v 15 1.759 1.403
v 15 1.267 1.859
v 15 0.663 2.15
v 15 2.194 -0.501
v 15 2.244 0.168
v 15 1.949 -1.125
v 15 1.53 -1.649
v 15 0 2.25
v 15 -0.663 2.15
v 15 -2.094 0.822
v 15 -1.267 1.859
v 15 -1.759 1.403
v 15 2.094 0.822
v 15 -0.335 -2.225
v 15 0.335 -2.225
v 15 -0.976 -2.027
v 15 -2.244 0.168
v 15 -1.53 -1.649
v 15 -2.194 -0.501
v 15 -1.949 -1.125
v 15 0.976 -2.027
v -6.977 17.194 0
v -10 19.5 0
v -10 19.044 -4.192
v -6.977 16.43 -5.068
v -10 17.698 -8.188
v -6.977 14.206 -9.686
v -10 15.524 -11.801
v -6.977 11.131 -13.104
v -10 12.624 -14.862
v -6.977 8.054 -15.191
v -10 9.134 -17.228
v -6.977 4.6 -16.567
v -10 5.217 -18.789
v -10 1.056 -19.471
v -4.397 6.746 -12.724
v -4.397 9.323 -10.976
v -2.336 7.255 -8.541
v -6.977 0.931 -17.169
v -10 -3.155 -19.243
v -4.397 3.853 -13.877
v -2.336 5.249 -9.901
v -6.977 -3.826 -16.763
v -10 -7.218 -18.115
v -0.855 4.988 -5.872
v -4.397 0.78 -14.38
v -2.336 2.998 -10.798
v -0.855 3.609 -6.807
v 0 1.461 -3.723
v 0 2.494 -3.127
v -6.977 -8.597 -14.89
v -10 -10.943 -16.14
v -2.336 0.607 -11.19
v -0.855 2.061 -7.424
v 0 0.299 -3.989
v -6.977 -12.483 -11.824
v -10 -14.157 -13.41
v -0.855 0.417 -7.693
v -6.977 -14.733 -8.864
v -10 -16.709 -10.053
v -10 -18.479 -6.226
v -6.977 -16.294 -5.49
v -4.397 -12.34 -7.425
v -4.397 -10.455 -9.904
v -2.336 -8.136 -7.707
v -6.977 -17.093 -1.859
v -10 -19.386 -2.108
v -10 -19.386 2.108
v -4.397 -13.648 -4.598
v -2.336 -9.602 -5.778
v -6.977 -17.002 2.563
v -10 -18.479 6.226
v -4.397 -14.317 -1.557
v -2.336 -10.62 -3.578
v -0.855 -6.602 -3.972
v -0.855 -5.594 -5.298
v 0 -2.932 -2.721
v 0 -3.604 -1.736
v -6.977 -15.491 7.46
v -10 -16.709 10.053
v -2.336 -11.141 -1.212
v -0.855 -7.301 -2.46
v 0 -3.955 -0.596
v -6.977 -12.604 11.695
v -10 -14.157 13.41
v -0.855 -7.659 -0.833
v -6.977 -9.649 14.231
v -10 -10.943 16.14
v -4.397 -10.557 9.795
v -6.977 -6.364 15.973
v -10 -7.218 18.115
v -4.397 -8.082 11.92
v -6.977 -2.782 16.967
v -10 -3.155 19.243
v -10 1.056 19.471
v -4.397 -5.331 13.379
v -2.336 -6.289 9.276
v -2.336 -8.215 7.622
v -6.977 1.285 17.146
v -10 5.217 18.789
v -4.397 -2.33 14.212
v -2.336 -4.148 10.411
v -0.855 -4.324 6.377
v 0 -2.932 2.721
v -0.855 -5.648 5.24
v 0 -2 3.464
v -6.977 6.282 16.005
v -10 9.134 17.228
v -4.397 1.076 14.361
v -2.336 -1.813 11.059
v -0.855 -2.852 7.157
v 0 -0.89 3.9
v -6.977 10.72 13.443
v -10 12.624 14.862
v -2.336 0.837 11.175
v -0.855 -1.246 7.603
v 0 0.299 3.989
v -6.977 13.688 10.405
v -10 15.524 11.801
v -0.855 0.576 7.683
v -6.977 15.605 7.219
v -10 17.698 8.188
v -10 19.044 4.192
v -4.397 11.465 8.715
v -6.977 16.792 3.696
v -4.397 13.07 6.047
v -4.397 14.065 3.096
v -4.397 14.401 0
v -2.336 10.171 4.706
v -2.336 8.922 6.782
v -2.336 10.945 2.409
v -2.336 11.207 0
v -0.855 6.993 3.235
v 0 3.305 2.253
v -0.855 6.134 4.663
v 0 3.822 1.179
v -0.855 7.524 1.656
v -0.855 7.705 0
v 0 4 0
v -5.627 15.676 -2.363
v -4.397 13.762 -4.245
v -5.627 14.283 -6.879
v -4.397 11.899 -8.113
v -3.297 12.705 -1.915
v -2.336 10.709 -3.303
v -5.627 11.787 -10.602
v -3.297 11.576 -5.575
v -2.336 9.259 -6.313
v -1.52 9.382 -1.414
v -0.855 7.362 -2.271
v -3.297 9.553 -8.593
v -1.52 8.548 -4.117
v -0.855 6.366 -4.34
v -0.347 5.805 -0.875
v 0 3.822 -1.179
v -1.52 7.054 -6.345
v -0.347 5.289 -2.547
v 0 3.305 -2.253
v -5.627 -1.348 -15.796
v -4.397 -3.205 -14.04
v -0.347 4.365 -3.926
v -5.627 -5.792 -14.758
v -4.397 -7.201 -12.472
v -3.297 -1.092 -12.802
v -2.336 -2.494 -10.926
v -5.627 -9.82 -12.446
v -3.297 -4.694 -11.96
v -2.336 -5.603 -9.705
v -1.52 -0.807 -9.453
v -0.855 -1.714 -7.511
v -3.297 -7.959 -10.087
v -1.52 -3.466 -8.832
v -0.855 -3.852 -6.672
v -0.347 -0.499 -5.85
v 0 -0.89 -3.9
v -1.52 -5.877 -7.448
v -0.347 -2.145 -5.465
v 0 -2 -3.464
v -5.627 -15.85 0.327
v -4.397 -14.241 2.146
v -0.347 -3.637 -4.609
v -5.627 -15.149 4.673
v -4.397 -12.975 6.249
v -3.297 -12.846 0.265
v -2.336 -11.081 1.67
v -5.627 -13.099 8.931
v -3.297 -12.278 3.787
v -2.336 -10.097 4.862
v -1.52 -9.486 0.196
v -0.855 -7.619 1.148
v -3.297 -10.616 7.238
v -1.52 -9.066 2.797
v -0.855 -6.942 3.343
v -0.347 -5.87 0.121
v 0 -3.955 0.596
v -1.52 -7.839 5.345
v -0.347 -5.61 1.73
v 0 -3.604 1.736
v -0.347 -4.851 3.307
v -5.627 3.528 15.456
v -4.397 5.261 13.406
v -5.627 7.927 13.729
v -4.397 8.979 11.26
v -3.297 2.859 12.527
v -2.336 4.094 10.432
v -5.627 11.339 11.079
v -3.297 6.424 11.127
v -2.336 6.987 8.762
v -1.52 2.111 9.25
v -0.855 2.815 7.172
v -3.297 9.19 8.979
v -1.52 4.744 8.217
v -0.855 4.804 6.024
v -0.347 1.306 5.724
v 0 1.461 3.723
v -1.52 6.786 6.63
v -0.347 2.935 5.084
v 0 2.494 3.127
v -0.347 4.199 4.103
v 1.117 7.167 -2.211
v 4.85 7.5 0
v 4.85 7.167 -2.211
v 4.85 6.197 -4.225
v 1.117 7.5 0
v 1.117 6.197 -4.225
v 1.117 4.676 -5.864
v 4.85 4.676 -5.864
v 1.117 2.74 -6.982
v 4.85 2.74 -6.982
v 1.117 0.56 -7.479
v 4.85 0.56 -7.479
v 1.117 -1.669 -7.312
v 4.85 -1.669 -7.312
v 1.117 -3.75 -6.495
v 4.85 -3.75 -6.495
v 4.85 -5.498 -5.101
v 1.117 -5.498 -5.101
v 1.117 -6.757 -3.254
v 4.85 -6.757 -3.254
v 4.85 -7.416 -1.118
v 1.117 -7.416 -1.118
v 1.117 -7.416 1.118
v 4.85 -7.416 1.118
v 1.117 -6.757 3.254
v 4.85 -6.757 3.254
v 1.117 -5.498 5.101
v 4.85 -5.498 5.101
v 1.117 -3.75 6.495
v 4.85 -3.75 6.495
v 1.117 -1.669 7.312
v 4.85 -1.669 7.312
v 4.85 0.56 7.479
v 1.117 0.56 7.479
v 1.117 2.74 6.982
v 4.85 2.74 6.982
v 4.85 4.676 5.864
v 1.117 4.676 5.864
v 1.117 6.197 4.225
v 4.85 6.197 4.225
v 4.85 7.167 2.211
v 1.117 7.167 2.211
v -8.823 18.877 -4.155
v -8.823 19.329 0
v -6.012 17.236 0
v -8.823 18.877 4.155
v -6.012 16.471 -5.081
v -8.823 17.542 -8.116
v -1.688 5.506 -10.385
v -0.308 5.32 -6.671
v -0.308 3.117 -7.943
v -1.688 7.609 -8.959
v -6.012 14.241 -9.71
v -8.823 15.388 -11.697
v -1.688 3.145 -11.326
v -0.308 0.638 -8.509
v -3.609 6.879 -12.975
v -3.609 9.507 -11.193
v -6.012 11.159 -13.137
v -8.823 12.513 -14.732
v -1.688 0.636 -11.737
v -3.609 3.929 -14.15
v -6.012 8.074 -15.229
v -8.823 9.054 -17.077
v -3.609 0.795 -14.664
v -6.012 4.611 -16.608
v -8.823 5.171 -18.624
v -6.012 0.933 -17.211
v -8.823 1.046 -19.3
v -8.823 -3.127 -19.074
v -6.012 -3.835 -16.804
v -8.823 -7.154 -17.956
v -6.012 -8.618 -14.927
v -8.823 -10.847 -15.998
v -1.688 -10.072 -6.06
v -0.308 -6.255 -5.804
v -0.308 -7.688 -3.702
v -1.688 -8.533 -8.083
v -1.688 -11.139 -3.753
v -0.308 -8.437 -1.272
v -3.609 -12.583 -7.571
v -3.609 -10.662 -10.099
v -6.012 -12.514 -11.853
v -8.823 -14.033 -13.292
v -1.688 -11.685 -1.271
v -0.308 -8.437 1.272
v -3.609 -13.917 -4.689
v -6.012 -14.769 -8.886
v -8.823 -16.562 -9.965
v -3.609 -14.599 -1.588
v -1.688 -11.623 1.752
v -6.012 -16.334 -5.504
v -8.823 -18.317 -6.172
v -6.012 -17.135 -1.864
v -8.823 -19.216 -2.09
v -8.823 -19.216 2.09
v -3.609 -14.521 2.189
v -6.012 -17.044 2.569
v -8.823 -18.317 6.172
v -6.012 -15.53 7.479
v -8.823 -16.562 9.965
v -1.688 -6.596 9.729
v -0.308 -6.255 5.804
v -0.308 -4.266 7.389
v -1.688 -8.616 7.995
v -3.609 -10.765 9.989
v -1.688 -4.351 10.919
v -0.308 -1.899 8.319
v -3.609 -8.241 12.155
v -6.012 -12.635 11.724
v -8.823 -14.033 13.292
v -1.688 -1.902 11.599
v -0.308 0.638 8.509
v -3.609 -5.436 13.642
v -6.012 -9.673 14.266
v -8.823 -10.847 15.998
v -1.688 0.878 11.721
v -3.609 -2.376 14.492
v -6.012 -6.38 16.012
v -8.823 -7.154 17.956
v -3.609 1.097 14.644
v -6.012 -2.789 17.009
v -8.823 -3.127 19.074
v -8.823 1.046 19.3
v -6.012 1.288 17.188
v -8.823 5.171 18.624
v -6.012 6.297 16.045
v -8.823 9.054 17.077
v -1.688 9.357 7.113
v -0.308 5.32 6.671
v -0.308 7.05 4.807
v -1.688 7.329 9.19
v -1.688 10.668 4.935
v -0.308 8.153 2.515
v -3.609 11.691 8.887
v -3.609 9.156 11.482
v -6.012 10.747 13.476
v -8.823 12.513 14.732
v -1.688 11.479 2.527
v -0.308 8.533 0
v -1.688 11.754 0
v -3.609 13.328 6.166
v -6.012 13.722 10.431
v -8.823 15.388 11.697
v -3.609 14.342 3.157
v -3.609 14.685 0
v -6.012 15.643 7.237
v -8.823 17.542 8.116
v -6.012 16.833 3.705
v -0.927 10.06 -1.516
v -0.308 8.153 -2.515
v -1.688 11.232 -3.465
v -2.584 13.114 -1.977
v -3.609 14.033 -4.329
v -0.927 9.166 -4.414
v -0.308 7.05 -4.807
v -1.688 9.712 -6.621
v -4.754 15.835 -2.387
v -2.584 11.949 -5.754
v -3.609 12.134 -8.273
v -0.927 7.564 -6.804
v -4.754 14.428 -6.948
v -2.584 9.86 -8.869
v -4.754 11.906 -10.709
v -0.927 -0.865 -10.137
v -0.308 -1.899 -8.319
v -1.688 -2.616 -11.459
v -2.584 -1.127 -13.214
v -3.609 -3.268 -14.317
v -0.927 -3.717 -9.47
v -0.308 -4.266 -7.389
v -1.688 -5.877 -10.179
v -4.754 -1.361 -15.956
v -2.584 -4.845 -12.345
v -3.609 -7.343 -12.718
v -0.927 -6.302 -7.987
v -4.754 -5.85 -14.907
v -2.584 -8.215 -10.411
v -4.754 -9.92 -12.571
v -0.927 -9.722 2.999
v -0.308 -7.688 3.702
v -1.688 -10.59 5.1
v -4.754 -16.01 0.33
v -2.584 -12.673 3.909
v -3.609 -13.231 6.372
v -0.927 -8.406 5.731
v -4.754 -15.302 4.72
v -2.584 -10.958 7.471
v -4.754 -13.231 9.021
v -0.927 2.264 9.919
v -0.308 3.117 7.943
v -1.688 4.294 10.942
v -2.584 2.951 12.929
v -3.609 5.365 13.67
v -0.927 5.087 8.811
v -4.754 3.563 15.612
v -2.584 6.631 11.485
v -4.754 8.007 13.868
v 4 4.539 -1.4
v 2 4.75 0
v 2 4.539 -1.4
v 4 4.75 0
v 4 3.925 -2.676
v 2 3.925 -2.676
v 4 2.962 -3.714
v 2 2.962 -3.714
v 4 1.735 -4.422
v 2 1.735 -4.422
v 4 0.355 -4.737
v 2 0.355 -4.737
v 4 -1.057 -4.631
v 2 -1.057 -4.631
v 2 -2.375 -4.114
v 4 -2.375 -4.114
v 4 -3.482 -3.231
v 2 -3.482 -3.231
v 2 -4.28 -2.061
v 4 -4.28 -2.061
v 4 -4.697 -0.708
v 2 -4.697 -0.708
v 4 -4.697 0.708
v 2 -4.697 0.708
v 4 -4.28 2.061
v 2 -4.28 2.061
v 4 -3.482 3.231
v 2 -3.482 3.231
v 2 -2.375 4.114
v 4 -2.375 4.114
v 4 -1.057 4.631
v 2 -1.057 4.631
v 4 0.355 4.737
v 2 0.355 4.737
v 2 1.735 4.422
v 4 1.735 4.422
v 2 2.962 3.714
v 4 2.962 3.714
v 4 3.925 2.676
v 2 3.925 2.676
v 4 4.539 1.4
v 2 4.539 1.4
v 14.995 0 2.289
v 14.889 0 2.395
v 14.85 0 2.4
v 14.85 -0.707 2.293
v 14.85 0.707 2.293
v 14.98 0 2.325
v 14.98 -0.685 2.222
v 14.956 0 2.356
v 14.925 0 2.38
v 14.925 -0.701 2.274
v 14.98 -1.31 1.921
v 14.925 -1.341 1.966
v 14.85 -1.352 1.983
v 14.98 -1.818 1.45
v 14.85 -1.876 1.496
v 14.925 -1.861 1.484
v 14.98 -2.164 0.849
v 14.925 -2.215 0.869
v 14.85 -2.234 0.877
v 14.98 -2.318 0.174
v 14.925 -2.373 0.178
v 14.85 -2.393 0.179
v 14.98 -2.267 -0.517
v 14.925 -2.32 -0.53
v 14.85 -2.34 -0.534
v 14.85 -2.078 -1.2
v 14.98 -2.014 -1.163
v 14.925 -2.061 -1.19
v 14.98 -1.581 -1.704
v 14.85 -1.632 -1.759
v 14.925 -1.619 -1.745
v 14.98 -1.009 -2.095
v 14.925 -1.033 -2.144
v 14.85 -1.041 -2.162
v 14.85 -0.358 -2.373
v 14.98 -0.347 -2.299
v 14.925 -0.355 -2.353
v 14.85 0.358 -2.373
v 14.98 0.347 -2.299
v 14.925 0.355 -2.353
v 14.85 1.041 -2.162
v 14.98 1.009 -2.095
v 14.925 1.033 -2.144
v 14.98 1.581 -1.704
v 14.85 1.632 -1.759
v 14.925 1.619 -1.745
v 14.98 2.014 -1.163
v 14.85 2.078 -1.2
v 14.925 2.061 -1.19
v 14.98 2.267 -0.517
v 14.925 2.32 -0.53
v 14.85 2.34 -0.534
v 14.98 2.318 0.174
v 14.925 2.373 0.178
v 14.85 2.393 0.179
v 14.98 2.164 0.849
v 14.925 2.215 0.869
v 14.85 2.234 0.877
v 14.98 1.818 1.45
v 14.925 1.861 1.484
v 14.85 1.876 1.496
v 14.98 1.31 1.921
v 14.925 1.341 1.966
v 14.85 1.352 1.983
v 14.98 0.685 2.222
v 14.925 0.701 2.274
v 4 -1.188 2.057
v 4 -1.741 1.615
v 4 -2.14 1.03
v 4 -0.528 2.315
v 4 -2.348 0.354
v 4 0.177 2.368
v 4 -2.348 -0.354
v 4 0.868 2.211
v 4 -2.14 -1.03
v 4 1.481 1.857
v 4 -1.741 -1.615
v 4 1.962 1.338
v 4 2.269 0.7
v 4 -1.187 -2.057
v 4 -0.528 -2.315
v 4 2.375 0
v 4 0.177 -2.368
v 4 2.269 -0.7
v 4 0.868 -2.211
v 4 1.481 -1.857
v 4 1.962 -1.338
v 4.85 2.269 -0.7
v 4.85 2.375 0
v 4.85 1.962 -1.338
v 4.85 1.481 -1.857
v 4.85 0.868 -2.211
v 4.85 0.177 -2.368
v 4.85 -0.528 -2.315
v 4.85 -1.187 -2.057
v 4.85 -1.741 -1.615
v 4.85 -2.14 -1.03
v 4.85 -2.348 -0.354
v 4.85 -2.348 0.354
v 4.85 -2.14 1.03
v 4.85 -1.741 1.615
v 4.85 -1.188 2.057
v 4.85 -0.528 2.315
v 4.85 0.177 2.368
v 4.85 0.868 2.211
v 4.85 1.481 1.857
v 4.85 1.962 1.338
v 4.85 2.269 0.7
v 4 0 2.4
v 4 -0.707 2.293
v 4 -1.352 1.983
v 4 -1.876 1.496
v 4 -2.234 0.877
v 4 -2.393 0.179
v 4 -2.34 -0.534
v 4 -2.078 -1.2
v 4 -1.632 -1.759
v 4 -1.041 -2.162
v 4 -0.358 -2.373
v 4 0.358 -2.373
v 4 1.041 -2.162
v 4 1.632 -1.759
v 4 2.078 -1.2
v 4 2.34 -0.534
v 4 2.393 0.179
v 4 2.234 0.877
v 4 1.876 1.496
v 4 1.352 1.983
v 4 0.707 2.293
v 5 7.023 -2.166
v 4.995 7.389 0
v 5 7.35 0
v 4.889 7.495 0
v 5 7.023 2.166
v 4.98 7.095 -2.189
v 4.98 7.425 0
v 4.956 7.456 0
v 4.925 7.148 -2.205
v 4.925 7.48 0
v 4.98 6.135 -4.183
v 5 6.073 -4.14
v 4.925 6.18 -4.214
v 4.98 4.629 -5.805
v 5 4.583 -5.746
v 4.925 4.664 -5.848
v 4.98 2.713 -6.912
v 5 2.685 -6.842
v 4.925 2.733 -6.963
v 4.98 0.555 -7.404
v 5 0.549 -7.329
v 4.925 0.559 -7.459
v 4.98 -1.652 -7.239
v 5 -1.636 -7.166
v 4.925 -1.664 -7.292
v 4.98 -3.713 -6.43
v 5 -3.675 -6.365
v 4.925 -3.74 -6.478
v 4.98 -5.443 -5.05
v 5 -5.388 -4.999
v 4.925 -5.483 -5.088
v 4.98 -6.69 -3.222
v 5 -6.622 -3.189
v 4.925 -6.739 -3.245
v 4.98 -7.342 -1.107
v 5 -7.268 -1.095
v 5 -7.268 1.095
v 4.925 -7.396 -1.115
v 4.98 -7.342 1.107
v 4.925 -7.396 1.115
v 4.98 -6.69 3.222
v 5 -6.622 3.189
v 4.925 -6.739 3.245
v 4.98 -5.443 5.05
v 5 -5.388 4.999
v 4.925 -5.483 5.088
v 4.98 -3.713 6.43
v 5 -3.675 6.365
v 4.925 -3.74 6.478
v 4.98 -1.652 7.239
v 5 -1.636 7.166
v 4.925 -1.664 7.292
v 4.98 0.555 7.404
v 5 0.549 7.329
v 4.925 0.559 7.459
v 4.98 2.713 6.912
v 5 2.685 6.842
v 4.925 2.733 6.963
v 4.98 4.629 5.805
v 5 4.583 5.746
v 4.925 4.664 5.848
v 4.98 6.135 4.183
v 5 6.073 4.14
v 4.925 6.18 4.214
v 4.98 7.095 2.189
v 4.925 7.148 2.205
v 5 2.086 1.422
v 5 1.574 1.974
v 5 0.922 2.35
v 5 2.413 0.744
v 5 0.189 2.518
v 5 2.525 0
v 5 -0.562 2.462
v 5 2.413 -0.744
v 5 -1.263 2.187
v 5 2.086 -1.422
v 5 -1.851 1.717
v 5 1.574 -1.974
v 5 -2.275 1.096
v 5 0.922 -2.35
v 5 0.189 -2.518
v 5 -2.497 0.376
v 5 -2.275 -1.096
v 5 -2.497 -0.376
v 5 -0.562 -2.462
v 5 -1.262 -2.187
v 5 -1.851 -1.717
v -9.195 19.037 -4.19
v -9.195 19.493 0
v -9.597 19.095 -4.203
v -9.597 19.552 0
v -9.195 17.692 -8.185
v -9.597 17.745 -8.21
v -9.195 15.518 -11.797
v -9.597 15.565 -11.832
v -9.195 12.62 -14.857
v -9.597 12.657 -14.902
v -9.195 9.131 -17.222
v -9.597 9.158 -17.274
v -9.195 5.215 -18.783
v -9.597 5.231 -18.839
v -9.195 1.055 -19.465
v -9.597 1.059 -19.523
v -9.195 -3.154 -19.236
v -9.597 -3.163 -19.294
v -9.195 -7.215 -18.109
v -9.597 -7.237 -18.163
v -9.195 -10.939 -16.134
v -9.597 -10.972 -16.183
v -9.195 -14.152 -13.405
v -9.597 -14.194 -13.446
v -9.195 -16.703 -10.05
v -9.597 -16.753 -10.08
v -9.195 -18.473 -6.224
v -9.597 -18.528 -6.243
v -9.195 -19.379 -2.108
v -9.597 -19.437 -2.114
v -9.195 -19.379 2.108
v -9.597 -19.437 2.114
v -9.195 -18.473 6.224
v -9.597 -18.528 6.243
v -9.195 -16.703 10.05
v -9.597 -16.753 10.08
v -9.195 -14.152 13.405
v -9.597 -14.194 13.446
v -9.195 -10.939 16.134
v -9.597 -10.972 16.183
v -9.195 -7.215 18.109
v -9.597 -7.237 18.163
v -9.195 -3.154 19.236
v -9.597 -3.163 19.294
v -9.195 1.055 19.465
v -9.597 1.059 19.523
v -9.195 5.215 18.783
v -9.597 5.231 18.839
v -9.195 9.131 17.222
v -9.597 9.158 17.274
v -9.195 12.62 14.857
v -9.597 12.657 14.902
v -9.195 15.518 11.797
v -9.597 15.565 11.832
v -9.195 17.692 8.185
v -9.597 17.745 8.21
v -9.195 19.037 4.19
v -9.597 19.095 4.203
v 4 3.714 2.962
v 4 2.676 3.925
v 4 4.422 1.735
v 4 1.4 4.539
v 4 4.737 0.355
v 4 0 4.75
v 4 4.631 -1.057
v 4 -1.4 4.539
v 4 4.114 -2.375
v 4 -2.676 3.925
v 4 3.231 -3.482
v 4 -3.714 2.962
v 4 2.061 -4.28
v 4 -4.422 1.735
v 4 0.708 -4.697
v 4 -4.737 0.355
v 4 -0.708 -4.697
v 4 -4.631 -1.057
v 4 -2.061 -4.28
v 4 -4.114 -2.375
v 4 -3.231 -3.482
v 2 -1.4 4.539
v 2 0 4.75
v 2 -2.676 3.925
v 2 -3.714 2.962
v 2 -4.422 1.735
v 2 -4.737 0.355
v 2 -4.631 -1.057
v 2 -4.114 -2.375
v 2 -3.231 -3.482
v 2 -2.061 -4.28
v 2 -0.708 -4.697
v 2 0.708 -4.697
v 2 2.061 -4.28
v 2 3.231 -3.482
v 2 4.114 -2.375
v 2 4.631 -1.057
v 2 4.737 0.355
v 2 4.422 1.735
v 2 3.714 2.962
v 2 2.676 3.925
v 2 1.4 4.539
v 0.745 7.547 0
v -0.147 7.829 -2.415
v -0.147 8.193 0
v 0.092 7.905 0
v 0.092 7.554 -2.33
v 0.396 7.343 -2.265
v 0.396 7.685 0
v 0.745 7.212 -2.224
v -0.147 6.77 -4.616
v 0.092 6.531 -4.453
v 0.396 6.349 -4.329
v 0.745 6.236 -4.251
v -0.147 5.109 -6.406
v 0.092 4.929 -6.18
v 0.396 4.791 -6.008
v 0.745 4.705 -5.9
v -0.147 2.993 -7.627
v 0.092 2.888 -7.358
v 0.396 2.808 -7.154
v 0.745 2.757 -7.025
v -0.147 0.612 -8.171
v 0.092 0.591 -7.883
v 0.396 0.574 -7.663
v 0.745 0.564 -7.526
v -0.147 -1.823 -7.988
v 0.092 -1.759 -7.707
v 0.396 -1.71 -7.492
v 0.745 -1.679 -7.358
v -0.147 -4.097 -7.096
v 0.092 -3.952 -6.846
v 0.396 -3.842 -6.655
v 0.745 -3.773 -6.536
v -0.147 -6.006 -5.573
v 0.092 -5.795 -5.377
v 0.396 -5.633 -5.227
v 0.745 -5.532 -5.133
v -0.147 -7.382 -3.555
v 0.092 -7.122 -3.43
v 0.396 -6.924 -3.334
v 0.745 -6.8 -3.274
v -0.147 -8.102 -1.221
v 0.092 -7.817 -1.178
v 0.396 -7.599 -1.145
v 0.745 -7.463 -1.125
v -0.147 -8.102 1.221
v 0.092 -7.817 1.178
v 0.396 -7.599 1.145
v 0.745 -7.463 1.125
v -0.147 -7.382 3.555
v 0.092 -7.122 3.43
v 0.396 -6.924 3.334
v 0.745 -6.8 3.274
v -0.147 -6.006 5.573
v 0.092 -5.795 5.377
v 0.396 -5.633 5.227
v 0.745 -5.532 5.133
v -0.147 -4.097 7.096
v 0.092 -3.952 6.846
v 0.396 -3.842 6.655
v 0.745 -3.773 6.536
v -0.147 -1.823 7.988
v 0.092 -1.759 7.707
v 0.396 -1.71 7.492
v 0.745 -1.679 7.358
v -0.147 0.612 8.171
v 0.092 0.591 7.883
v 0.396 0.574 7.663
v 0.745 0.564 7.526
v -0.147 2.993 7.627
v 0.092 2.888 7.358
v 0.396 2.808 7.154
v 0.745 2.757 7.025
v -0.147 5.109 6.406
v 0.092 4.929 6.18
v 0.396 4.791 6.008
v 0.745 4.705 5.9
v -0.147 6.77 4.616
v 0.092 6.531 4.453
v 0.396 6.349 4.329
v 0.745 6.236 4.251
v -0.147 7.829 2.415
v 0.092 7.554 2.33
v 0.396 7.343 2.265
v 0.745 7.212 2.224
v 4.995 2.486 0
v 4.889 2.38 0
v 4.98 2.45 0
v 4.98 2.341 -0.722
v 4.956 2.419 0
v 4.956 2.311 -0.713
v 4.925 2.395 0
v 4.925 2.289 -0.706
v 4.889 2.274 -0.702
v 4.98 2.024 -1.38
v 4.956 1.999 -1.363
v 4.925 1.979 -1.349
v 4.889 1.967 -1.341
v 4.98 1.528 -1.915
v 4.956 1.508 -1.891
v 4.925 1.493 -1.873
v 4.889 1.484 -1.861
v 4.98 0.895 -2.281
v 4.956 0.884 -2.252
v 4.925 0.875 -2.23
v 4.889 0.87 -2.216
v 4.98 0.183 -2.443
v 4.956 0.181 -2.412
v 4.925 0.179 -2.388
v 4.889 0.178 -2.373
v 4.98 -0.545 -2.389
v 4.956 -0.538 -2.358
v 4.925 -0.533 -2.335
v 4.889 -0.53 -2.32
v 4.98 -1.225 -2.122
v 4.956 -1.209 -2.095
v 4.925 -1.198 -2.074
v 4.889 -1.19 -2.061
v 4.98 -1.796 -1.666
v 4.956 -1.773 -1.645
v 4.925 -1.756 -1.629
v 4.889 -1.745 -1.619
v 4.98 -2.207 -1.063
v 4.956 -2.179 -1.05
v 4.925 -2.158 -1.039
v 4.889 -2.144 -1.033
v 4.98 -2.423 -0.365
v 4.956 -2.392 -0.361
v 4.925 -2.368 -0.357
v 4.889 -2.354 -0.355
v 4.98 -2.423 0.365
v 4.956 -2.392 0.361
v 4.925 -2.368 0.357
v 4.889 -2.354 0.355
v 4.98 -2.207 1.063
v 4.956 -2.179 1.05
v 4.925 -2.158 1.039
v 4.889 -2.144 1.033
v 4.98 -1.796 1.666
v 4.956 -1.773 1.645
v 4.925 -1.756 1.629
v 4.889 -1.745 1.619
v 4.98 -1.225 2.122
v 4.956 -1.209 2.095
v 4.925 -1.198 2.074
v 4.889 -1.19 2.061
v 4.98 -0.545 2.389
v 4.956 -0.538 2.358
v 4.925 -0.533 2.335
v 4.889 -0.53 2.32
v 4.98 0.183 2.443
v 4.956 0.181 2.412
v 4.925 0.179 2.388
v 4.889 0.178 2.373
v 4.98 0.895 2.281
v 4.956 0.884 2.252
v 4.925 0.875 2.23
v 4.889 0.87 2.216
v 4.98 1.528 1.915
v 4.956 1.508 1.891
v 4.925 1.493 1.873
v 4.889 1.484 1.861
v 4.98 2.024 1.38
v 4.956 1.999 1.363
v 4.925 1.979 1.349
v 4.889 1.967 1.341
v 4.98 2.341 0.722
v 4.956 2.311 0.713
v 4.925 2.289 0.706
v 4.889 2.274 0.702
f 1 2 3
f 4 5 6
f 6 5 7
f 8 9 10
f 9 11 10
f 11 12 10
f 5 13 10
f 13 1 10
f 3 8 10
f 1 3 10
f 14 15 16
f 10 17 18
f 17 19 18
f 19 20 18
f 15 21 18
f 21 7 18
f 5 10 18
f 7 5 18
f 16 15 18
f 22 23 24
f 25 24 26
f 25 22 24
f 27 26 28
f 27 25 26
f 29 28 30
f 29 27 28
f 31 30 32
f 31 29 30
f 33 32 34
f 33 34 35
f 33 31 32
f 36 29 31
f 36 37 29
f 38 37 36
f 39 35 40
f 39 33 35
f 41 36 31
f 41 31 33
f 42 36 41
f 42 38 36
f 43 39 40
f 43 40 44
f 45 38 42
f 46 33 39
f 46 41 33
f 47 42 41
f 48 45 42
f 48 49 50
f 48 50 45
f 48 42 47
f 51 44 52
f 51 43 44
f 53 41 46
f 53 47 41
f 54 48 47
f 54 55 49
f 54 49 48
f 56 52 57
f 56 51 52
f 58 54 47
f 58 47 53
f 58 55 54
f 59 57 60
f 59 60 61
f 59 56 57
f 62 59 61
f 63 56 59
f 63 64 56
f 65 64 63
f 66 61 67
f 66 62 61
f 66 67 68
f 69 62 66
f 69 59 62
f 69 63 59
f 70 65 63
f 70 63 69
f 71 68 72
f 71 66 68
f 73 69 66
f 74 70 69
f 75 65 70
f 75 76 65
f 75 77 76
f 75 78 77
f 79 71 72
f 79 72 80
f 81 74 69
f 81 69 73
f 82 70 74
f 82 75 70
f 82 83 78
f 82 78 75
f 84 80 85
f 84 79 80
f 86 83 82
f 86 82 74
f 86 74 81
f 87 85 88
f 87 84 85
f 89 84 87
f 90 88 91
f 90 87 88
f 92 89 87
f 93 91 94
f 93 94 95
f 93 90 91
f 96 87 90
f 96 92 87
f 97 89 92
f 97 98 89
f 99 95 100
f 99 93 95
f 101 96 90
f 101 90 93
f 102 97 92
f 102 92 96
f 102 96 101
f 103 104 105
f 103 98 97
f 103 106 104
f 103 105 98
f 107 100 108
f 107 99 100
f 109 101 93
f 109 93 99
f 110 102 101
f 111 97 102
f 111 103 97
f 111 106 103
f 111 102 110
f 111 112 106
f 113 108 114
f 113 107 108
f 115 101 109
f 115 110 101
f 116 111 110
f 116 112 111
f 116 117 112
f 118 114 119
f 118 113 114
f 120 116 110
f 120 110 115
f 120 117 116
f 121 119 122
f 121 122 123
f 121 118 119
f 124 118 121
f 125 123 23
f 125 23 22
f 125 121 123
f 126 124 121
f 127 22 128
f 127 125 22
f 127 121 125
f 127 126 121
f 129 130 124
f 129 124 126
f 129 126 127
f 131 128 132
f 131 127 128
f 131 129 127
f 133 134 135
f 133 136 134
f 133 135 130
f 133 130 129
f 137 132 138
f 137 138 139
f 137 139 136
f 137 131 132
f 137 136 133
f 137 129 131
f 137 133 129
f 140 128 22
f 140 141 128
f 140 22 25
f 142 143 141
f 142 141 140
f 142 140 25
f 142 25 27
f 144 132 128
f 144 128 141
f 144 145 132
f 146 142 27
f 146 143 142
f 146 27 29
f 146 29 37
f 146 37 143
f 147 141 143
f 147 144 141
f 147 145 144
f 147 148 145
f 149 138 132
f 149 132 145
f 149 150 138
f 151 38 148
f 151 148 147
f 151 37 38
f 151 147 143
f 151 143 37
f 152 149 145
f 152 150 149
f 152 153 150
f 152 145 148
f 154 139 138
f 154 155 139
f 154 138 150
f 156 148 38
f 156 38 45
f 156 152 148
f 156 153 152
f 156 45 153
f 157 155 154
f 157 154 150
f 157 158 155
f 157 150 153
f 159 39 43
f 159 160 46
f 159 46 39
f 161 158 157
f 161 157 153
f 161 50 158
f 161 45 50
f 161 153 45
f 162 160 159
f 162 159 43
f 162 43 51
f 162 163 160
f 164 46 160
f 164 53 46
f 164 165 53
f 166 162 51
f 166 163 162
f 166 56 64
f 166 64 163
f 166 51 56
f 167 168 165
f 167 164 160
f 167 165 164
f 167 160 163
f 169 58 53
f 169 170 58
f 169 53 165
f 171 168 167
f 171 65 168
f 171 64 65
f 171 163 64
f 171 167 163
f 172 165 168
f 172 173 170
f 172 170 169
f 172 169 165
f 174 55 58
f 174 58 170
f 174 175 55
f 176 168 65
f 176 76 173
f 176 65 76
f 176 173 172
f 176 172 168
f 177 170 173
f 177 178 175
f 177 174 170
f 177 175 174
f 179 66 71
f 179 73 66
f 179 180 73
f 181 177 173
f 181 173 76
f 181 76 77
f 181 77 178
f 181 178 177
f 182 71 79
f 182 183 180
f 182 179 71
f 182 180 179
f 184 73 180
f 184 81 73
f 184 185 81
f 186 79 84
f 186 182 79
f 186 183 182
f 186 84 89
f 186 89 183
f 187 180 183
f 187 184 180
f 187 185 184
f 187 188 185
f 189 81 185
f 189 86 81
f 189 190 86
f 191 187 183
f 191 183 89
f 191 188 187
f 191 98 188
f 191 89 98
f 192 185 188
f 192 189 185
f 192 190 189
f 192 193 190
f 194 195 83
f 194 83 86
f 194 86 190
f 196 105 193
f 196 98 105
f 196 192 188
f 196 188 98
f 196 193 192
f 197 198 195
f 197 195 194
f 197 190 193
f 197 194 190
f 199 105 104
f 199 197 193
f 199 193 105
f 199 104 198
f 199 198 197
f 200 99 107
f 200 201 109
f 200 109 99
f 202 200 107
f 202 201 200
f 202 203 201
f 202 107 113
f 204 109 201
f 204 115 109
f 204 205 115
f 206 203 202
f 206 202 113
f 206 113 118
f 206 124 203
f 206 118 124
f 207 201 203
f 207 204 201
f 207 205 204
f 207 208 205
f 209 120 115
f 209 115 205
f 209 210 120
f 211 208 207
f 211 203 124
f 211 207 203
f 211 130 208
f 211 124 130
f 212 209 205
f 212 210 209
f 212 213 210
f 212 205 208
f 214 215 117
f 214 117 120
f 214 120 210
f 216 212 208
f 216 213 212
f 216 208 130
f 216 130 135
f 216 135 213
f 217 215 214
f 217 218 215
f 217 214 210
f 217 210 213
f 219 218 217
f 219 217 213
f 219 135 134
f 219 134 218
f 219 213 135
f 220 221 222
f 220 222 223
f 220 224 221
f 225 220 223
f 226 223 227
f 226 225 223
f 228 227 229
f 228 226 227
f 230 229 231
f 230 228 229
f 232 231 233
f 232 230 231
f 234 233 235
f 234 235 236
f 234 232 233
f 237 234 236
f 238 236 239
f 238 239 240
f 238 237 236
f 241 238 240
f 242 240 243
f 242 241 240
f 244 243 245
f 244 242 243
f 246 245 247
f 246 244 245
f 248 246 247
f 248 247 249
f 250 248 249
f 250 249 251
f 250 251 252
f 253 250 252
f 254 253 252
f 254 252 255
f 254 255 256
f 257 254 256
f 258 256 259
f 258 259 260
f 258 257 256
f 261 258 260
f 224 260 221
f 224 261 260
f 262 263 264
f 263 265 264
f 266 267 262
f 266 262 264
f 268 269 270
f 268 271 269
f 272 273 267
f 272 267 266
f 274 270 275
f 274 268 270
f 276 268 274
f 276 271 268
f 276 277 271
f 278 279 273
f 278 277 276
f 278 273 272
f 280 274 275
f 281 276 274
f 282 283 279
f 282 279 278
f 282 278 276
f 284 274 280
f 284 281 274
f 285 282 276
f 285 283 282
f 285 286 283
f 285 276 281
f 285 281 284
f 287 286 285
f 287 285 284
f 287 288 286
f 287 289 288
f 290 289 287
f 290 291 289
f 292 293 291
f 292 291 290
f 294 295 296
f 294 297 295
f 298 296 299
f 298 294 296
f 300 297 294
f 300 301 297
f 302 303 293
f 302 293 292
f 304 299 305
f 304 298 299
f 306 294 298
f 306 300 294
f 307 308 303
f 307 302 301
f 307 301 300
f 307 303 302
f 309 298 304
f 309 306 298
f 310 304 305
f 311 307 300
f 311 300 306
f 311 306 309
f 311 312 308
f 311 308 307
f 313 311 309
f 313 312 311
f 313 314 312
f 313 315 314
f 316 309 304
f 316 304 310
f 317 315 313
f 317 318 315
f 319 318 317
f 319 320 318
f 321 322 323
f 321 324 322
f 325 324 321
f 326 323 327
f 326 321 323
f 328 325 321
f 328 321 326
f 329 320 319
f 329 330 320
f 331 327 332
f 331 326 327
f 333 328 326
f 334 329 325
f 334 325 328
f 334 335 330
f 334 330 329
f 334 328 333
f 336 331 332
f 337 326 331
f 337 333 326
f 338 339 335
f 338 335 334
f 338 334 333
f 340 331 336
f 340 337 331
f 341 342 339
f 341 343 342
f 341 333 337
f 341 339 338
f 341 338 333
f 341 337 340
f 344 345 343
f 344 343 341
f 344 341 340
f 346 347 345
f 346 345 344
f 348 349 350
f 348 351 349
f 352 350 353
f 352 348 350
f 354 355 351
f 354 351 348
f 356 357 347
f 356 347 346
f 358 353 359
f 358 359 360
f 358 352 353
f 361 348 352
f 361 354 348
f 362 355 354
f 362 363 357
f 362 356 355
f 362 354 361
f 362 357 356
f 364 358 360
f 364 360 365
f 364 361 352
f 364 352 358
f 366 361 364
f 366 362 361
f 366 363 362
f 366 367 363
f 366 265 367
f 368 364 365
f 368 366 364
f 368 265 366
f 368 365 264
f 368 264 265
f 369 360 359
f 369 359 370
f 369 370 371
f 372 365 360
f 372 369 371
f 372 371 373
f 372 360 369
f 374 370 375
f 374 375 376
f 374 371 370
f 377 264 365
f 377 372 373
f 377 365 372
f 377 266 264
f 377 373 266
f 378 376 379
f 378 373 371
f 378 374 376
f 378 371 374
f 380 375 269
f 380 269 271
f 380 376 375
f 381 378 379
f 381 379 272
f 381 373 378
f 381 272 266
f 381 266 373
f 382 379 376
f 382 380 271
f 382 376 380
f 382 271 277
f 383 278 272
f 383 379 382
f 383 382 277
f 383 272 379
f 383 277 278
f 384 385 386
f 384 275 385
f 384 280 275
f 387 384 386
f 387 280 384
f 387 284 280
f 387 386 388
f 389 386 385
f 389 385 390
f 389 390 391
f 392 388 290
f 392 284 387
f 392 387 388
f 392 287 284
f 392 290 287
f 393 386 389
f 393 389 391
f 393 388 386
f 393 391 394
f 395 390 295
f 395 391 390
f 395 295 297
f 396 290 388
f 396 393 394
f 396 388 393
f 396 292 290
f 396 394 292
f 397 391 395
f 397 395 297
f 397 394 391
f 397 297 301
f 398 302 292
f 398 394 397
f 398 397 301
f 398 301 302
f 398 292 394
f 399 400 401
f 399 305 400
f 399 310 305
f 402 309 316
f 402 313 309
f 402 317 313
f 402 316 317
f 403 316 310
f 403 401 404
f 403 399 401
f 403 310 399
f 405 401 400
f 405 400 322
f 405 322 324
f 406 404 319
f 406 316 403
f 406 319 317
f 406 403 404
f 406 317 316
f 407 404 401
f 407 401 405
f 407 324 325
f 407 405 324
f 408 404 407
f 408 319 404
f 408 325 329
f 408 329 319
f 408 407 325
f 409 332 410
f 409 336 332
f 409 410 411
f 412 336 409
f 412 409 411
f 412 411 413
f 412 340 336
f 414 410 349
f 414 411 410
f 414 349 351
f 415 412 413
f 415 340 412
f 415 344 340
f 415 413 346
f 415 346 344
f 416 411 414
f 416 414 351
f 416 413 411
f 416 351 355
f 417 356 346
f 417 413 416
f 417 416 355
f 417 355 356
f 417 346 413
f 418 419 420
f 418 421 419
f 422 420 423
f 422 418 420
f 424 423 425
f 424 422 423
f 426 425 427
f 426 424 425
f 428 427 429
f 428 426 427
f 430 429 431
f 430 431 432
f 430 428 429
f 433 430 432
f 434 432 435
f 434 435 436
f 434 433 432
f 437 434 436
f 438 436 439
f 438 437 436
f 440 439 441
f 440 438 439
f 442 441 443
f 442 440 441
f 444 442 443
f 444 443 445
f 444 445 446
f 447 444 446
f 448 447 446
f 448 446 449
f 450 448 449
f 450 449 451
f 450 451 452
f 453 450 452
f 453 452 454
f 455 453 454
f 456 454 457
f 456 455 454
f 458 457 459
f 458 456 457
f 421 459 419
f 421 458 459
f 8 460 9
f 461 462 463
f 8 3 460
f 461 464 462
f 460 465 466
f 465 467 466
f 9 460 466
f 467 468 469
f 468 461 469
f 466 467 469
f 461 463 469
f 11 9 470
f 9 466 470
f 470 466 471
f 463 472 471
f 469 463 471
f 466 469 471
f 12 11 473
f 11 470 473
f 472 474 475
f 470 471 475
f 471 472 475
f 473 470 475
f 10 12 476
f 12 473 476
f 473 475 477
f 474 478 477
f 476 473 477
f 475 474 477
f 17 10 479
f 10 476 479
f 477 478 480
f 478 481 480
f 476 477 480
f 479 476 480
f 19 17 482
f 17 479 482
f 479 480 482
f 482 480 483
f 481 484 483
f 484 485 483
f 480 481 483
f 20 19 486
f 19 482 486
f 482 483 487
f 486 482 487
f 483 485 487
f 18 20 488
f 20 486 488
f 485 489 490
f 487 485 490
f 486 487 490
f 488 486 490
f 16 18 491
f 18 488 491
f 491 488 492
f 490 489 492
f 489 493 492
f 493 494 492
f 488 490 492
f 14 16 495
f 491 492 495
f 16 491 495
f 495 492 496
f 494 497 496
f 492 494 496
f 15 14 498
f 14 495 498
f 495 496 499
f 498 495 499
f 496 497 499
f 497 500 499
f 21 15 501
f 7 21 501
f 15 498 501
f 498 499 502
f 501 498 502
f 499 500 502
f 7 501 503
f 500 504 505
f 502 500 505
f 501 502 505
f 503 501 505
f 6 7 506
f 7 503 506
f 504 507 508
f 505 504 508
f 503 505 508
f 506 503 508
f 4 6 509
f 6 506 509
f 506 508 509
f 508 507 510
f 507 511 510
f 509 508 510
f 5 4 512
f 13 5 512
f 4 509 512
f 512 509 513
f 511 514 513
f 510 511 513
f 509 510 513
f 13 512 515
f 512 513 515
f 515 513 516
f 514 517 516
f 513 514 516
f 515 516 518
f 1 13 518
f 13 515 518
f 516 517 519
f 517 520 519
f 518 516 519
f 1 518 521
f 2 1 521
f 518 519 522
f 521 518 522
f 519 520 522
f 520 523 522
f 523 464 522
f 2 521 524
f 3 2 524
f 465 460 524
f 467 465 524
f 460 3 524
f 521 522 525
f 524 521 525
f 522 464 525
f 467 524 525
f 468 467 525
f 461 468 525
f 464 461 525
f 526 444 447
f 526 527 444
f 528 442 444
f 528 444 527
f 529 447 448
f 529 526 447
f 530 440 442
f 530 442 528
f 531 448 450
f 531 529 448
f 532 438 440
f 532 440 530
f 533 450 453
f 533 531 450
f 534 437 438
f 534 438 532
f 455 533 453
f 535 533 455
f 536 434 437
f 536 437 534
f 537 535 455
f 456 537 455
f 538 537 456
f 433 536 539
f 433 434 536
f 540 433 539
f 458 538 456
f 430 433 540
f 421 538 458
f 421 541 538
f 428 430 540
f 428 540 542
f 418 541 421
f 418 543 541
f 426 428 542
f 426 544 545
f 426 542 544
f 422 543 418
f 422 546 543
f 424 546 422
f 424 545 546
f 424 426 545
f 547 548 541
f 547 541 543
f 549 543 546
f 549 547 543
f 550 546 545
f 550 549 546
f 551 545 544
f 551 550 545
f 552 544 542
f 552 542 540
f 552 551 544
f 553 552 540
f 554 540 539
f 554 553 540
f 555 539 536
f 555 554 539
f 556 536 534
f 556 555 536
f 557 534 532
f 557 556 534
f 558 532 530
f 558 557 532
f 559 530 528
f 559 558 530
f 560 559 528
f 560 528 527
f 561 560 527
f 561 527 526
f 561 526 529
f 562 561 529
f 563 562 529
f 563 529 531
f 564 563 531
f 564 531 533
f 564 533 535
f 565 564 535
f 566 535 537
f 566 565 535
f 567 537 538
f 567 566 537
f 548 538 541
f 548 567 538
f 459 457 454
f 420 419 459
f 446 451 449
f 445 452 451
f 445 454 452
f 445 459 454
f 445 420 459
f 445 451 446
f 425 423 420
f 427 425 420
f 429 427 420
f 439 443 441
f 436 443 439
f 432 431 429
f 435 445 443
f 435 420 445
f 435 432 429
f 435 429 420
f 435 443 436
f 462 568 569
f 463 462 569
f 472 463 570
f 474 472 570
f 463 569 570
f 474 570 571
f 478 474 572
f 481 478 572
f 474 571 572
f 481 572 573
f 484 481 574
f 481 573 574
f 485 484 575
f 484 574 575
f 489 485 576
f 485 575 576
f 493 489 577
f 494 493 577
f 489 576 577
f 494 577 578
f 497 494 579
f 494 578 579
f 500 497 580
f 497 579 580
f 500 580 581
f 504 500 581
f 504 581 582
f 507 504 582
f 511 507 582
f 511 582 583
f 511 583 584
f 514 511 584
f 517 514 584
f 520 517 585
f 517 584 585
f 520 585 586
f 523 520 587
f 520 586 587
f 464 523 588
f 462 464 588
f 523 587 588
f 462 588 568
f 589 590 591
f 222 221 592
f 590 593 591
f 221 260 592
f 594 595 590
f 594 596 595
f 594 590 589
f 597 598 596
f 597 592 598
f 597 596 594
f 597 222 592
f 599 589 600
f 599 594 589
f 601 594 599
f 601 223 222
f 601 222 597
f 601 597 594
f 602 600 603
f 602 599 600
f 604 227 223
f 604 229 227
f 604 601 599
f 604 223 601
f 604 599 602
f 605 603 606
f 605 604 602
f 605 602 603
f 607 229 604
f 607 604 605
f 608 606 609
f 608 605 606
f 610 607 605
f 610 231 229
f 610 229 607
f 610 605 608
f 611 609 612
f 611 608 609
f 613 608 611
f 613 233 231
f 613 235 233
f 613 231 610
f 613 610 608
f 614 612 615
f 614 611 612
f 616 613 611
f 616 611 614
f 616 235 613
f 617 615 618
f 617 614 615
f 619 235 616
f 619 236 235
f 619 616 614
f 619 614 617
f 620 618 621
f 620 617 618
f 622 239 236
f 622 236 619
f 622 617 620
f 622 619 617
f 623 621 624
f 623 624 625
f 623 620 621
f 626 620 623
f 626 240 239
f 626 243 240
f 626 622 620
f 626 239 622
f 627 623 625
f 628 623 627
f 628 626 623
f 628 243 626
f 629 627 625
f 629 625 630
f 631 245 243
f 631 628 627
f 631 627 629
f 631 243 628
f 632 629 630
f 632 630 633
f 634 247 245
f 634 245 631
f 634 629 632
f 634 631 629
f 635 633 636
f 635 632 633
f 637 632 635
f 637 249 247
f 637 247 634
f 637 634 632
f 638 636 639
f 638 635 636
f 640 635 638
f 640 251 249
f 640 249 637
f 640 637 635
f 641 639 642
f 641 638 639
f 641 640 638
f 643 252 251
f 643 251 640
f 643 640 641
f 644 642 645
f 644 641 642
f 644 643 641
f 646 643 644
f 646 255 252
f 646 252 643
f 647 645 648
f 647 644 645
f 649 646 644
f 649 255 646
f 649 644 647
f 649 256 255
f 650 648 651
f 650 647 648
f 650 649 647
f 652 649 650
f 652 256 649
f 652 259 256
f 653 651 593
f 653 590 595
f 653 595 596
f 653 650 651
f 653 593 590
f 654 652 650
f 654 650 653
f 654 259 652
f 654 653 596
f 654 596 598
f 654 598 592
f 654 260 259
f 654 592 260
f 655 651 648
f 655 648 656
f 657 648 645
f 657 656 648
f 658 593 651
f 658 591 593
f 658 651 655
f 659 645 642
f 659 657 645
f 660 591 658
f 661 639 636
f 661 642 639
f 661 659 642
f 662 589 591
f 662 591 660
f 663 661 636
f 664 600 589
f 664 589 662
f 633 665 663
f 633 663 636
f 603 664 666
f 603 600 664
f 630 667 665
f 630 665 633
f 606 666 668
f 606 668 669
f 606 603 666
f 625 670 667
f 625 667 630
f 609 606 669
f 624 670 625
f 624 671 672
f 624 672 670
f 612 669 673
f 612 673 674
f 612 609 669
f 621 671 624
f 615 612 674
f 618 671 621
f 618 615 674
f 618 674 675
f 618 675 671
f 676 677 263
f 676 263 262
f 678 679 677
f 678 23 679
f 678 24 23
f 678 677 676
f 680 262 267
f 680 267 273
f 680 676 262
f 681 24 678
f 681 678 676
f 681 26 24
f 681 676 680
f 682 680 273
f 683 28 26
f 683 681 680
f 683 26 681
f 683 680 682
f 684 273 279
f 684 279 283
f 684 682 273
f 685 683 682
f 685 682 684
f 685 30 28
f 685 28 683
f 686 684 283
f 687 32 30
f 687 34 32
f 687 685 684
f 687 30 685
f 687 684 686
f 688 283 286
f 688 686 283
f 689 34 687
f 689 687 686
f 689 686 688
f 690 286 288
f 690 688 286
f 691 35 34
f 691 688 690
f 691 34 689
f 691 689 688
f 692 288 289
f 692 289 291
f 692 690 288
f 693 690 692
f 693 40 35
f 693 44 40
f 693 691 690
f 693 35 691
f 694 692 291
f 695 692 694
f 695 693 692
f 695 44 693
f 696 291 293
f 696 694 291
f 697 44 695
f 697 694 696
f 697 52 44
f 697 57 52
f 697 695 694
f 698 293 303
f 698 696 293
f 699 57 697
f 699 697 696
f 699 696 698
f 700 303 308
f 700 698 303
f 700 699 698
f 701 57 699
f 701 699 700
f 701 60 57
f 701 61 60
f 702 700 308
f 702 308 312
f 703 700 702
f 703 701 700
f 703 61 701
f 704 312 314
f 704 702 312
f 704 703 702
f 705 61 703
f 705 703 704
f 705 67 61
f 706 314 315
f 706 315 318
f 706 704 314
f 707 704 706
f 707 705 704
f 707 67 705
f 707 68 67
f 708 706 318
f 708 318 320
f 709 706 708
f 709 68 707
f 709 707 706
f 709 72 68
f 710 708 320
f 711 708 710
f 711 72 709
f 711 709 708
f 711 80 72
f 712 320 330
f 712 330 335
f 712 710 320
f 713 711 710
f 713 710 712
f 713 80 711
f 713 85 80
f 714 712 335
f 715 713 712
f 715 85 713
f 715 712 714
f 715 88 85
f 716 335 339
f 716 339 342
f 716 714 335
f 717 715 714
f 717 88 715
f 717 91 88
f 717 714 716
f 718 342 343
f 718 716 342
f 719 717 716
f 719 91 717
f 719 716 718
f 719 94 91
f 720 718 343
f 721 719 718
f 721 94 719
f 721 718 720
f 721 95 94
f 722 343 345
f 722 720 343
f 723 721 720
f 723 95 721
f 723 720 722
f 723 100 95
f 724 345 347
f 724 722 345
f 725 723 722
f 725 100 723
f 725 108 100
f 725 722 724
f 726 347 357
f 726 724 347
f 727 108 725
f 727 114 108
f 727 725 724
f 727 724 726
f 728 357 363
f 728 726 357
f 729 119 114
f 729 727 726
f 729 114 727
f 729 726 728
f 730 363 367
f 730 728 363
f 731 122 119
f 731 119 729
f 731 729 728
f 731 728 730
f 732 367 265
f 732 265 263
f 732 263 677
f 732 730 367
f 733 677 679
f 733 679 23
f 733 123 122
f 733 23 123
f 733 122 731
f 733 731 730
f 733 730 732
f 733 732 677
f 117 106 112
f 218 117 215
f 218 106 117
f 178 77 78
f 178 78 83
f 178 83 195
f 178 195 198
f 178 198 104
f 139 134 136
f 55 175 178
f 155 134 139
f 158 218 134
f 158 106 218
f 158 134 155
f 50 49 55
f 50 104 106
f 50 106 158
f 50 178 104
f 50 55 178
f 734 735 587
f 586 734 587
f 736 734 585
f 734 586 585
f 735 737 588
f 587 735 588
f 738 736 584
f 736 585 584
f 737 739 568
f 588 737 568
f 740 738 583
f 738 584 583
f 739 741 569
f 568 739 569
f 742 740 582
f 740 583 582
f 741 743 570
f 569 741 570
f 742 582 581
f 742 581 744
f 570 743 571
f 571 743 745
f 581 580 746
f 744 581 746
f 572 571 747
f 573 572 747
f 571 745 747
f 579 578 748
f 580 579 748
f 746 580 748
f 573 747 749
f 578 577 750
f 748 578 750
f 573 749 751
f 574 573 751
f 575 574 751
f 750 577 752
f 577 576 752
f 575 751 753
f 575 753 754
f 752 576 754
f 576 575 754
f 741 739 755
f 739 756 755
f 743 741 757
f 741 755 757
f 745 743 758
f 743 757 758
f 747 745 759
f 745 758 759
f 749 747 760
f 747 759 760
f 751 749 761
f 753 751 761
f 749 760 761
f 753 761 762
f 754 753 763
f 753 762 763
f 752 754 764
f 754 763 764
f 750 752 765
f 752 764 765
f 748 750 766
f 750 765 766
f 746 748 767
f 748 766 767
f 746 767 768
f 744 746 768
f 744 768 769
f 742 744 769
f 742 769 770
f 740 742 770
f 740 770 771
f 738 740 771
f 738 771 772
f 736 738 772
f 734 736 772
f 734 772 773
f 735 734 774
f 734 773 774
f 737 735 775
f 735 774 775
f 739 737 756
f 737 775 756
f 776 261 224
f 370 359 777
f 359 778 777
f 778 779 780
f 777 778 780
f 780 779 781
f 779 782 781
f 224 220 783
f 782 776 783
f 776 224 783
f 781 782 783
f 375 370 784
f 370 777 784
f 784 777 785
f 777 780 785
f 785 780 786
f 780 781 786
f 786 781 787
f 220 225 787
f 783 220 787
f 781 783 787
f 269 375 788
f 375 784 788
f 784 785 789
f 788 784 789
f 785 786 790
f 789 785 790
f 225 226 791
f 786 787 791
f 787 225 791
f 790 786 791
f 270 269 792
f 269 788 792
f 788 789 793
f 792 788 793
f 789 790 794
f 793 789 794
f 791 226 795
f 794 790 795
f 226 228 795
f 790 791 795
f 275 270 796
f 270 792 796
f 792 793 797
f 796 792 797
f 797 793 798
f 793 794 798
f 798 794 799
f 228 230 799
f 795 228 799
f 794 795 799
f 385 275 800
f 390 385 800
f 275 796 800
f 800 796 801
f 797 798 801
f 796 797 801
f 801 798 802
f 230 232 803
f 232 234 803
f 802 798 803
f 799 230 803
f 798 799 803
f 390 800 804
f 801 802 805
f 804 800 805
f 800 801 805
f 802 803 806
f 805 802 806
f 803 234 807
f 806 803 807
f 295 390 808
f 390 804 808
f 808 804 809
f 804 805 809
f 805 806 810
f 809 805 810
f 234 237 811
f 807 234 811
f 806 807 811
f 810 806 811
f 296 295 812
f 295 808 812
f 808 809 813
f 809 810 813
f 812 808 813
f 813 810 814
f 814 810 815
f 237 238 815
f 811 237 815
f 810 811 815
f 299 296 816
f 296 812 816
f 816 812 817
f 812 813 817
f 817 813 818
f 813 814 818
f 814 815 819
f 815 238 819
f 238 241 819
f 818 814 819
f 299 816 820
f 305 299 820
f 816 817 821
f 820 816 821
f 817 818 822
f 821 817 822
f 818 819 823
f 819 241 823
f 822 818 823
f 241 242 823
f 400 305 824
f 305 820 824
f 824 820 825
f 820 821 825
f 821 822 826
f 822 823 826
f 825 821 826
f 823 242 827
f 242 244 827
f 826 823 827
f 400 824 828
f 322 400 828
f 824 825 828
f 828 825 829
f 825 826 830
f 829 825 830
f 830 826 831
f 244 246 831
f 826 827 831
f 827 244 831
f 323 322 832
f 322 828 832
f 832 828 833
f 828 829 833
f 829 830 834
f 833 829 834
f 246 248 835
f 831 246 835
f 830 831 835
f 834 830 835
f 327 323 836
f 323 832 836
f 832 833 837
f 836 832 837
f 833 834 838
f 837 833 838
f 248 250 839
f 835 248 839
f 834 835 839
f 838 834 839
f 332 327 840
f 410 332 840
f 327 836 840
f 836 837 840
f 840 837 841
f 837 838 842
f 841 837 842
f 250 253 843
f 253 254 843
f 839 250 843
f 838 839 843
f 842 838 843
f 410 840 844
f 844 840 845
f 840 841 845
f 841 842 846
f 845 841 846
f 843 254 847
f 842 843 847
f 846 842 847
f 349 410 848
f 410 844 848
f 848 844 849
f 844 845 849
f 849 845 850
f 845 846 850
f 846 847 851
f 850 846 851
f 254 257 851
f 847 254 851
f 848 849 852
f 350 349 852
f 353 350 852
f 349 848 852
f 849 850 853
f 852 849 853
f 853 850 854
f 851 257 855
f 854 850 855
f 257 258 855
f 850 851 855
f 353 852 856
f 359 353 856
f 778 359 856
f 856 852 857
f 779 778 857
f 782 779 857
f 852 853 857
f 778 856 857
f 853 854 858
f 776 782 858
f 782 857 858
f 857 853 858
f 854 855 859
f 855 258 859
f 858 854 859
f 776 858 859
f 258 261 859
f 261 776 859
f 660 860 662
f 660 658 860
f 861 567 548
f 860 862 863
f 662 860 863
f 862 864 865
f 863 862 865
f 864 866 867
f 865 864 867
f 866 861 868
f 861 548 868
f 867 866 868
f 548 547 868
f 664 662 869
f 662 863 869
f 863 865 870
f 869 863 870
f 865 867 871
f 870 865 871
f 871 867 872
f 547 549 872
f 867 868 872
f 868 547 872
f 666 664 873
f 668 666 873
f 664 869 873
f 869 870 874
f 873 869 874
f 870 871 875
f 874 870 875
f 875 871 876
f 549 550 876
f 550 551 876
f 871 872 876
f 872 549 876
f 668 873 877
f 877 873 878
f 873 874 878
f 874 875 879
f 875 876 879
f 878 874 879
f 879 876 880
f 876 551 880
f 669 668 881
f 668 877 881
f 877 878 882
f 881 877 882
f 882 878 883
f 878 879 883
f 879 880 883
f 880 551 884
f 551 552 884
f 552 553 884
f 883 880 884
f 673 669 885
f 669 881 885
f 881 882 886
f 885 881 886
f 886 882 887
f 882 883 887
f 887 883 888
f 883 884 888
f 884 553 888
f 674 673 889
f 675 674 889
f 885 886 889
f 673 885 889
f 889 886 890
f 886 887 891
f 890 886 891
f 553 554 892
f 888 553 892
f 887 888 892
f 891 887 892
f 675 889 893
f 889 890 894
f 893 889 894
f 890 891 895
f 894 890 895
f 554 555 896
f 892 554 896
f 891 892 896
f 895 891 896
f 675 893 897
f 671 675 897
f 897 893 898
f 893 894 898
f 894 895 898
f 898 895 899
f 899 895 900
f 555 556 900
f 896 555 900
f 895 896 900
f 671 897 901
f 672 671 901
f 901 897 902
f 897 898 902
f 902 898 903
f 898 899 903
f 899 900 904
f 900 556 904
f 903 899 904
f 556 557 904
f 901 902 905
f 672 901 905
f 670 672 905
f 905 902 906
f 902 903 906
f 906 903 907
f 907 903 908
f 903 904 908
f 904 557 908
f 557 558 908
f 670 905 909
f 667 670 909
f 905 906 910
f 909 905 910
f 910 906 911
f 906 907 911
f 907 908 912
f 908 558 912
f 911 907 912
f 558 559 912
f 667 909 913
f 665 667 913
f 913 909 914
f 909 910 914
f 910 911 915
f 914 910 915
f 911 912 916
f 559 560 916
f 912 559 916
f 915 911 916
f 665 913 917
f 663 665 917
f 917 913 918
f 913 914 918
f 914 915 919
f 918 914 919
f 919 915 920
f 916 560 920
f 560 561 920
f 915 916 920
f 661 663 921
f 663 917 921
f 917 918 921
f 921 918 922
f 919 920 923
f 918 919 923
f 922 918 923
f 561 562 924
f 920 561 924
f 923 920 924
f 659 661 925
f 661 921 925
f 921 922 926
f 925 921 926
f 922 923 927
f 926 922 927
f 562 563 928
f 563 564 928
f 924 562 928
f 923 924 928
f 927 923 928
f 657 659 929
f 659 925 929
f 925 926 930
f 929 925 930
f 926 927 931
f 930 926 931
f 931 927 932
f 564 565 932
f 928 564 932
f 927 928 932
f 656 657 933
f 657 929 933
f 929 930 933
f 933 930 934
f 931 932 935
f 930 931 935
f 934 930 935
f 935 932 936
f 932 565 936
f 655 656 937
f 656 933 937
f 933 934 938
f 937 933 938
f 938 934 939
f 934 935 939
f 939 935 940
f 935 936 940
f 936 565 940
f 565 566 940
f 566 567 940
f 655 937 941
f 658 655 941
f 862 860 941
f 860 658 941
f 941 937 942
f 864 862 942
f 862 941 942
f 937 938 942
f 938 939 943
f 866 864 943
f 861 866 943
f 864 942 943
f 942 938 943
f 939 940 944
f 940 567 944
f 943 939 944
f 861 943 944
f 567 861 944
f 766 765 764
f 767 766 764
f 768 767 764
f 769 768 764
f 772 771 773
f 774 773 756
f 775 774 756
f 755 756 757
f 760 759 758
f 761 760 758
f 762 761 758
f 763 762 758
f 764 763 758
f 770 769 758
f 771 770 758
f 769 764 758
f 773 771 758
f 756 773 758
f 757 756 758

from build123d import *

# Parameters (mm, degrees)
FILLET1_R = 0.15
FILLET2_R = 0.15
FILLET3_R = 1.5
FILLET4_R = 0.15


with BuildPart() as part:
    # Sketch1 → Revolve1 (revolve)
    with BuildSketch(Plane.XY):
        with BuildLine():
            Line((0, 4.000000000000002), (0, 0))
            Line((0, 0), (2, 0))
            Line((2, 0), (2, 4.75))
            Line((2, 4.75), (4, 4.75))
            Line((4, 4.75), (4, 2.375))
            Line((4, 2.375), (5, 2.375))
            Line((5, 2.375), (5, 7.499999999999999))
            Line((5, 7.499999999999999), (0, 7.5))
            ThreePointArc((3.55e-15, 7.499999999999998), (-3.6948542111989937, 14.794116631040804), (-10, 20.000000000000004))
            Line((-10, 20), (-10, 19.5))
            ThreePointArc((-9.999999999999995, 19.500000000000004), (-3.297071481987519, 12.848663560008053), (7.11e-15, 4.000000000000002))
        make_face()
    revolve(axis=Axis((0, 0, 0), (-1, -1.2e-16, 0)))

    # Fillet1
    fillet1_edges = [part.edges().sort_by_distance(p)[0] for p in [
        (5.000000000000002, -7.499999999999997, -9.2e-16),
    ]]
    fillet(fillet1_edges, radius=FILLET1_R)

    # Fillet2
    fillet2_edges = [part.edges().sort_by_distance(p)[0] for p in [
        (5, -2.374999999999999, -2.9e-16),
    ]]
    fillet(fillet2_edges, radius=FILLET2_R)

    # Fillet3
    # the kernel refuses this fillet: 1.5 mm, written as the material it adds along each edge
    with BuildSketch(Plane(origin=(2.69e-15, 0, 0), x_dir=(-1.2e-16, 1, 0), z_dir=(0, 0, 1))) as fillet3_piece_1:
        with BuildLine():
            CenterArc((8.999999999999998, -1.117230925801226), FILLET3_R, 108.1567582497087, 71.84324175029133)
            ThreePointArc((8.532573186973416, 0.3080803294913892), (8.018361800934953, 0.14708482432521733), (7.499999999999998, 0))
            Line((7.499999999999998, 0), (7.499999999999998, -1.117230925801226))
        make_face()
    revolve(axis=Axis((2.69e-15, 0, 0), (-1, -1.2e-16, 0)))
    # the kernel refuses this fillet: 1.5 mm, written as the material it takes off along each edge
    with BuildSketch(Plane(origin=(-9.999999999999998, -1.22e-15, 0), x_dir=(-9e-17, 1, 0), z_dir=(0, 0, 1))) as fillet3_2_piece_1:
        with BuildLine():
            CenterArc((18.05169355974905, -0.3903952550027688), FILLET3_R, 328.36768147729936, 46.71801659257376)
            Line((19.499999999999662, -9.233e-14), (20, 1.78e-15))
            ThreePointArc((20, 1.78e-15), (19.67439153999357, -0.5942328025349539), (19.328840414867702, -1.1770946324402587))
        make_face()
    revolve(axis=Axis((-9.999999999999998, -1.22e-15, 0), (-1, -1.2e-16, 0)), mode=Mode.SUBTRACT)


with BuildPart() as body_2:
    # Sketch2 → Revolve2 (revolve)
    with BuildSketch(Plane(origin=(0, 0, 0), x_dir=(1, 0, 0), z_dir=(0, 1, 0)), mode=Mode.PRIVATE) as revolve2_sk:
        Polygon((2.0000000000000004, 4.7499999999999964), (2.0000000000000004, 0), (15.000000000000004, 2.41e-15), (15.000000000000004, 2.4), (4.000000000000001, 2.399999999999996), (4.000000000000001, 4.7499999999999964), align=None)
    revolve(revolve2_sk.sketch.rotate(Axis((2.0000000000000004, 0, 0), (1, 0, -1.9e-16)), 180), axis=Axis((2.0000000000000004, 0, 0), (1, 0, -1.9e-16)))

    # Fillet4
    fillet4_edges = [body_2.edges().sort_by_distance(p)[0] for p in [
        (15.000000000000005, -5.9e-16, -2.3999999999999995),
    ]]
    fillet(fillet4_edges, radius=FILLET4_R)


solid = Compound([part.part, body_2.part])
